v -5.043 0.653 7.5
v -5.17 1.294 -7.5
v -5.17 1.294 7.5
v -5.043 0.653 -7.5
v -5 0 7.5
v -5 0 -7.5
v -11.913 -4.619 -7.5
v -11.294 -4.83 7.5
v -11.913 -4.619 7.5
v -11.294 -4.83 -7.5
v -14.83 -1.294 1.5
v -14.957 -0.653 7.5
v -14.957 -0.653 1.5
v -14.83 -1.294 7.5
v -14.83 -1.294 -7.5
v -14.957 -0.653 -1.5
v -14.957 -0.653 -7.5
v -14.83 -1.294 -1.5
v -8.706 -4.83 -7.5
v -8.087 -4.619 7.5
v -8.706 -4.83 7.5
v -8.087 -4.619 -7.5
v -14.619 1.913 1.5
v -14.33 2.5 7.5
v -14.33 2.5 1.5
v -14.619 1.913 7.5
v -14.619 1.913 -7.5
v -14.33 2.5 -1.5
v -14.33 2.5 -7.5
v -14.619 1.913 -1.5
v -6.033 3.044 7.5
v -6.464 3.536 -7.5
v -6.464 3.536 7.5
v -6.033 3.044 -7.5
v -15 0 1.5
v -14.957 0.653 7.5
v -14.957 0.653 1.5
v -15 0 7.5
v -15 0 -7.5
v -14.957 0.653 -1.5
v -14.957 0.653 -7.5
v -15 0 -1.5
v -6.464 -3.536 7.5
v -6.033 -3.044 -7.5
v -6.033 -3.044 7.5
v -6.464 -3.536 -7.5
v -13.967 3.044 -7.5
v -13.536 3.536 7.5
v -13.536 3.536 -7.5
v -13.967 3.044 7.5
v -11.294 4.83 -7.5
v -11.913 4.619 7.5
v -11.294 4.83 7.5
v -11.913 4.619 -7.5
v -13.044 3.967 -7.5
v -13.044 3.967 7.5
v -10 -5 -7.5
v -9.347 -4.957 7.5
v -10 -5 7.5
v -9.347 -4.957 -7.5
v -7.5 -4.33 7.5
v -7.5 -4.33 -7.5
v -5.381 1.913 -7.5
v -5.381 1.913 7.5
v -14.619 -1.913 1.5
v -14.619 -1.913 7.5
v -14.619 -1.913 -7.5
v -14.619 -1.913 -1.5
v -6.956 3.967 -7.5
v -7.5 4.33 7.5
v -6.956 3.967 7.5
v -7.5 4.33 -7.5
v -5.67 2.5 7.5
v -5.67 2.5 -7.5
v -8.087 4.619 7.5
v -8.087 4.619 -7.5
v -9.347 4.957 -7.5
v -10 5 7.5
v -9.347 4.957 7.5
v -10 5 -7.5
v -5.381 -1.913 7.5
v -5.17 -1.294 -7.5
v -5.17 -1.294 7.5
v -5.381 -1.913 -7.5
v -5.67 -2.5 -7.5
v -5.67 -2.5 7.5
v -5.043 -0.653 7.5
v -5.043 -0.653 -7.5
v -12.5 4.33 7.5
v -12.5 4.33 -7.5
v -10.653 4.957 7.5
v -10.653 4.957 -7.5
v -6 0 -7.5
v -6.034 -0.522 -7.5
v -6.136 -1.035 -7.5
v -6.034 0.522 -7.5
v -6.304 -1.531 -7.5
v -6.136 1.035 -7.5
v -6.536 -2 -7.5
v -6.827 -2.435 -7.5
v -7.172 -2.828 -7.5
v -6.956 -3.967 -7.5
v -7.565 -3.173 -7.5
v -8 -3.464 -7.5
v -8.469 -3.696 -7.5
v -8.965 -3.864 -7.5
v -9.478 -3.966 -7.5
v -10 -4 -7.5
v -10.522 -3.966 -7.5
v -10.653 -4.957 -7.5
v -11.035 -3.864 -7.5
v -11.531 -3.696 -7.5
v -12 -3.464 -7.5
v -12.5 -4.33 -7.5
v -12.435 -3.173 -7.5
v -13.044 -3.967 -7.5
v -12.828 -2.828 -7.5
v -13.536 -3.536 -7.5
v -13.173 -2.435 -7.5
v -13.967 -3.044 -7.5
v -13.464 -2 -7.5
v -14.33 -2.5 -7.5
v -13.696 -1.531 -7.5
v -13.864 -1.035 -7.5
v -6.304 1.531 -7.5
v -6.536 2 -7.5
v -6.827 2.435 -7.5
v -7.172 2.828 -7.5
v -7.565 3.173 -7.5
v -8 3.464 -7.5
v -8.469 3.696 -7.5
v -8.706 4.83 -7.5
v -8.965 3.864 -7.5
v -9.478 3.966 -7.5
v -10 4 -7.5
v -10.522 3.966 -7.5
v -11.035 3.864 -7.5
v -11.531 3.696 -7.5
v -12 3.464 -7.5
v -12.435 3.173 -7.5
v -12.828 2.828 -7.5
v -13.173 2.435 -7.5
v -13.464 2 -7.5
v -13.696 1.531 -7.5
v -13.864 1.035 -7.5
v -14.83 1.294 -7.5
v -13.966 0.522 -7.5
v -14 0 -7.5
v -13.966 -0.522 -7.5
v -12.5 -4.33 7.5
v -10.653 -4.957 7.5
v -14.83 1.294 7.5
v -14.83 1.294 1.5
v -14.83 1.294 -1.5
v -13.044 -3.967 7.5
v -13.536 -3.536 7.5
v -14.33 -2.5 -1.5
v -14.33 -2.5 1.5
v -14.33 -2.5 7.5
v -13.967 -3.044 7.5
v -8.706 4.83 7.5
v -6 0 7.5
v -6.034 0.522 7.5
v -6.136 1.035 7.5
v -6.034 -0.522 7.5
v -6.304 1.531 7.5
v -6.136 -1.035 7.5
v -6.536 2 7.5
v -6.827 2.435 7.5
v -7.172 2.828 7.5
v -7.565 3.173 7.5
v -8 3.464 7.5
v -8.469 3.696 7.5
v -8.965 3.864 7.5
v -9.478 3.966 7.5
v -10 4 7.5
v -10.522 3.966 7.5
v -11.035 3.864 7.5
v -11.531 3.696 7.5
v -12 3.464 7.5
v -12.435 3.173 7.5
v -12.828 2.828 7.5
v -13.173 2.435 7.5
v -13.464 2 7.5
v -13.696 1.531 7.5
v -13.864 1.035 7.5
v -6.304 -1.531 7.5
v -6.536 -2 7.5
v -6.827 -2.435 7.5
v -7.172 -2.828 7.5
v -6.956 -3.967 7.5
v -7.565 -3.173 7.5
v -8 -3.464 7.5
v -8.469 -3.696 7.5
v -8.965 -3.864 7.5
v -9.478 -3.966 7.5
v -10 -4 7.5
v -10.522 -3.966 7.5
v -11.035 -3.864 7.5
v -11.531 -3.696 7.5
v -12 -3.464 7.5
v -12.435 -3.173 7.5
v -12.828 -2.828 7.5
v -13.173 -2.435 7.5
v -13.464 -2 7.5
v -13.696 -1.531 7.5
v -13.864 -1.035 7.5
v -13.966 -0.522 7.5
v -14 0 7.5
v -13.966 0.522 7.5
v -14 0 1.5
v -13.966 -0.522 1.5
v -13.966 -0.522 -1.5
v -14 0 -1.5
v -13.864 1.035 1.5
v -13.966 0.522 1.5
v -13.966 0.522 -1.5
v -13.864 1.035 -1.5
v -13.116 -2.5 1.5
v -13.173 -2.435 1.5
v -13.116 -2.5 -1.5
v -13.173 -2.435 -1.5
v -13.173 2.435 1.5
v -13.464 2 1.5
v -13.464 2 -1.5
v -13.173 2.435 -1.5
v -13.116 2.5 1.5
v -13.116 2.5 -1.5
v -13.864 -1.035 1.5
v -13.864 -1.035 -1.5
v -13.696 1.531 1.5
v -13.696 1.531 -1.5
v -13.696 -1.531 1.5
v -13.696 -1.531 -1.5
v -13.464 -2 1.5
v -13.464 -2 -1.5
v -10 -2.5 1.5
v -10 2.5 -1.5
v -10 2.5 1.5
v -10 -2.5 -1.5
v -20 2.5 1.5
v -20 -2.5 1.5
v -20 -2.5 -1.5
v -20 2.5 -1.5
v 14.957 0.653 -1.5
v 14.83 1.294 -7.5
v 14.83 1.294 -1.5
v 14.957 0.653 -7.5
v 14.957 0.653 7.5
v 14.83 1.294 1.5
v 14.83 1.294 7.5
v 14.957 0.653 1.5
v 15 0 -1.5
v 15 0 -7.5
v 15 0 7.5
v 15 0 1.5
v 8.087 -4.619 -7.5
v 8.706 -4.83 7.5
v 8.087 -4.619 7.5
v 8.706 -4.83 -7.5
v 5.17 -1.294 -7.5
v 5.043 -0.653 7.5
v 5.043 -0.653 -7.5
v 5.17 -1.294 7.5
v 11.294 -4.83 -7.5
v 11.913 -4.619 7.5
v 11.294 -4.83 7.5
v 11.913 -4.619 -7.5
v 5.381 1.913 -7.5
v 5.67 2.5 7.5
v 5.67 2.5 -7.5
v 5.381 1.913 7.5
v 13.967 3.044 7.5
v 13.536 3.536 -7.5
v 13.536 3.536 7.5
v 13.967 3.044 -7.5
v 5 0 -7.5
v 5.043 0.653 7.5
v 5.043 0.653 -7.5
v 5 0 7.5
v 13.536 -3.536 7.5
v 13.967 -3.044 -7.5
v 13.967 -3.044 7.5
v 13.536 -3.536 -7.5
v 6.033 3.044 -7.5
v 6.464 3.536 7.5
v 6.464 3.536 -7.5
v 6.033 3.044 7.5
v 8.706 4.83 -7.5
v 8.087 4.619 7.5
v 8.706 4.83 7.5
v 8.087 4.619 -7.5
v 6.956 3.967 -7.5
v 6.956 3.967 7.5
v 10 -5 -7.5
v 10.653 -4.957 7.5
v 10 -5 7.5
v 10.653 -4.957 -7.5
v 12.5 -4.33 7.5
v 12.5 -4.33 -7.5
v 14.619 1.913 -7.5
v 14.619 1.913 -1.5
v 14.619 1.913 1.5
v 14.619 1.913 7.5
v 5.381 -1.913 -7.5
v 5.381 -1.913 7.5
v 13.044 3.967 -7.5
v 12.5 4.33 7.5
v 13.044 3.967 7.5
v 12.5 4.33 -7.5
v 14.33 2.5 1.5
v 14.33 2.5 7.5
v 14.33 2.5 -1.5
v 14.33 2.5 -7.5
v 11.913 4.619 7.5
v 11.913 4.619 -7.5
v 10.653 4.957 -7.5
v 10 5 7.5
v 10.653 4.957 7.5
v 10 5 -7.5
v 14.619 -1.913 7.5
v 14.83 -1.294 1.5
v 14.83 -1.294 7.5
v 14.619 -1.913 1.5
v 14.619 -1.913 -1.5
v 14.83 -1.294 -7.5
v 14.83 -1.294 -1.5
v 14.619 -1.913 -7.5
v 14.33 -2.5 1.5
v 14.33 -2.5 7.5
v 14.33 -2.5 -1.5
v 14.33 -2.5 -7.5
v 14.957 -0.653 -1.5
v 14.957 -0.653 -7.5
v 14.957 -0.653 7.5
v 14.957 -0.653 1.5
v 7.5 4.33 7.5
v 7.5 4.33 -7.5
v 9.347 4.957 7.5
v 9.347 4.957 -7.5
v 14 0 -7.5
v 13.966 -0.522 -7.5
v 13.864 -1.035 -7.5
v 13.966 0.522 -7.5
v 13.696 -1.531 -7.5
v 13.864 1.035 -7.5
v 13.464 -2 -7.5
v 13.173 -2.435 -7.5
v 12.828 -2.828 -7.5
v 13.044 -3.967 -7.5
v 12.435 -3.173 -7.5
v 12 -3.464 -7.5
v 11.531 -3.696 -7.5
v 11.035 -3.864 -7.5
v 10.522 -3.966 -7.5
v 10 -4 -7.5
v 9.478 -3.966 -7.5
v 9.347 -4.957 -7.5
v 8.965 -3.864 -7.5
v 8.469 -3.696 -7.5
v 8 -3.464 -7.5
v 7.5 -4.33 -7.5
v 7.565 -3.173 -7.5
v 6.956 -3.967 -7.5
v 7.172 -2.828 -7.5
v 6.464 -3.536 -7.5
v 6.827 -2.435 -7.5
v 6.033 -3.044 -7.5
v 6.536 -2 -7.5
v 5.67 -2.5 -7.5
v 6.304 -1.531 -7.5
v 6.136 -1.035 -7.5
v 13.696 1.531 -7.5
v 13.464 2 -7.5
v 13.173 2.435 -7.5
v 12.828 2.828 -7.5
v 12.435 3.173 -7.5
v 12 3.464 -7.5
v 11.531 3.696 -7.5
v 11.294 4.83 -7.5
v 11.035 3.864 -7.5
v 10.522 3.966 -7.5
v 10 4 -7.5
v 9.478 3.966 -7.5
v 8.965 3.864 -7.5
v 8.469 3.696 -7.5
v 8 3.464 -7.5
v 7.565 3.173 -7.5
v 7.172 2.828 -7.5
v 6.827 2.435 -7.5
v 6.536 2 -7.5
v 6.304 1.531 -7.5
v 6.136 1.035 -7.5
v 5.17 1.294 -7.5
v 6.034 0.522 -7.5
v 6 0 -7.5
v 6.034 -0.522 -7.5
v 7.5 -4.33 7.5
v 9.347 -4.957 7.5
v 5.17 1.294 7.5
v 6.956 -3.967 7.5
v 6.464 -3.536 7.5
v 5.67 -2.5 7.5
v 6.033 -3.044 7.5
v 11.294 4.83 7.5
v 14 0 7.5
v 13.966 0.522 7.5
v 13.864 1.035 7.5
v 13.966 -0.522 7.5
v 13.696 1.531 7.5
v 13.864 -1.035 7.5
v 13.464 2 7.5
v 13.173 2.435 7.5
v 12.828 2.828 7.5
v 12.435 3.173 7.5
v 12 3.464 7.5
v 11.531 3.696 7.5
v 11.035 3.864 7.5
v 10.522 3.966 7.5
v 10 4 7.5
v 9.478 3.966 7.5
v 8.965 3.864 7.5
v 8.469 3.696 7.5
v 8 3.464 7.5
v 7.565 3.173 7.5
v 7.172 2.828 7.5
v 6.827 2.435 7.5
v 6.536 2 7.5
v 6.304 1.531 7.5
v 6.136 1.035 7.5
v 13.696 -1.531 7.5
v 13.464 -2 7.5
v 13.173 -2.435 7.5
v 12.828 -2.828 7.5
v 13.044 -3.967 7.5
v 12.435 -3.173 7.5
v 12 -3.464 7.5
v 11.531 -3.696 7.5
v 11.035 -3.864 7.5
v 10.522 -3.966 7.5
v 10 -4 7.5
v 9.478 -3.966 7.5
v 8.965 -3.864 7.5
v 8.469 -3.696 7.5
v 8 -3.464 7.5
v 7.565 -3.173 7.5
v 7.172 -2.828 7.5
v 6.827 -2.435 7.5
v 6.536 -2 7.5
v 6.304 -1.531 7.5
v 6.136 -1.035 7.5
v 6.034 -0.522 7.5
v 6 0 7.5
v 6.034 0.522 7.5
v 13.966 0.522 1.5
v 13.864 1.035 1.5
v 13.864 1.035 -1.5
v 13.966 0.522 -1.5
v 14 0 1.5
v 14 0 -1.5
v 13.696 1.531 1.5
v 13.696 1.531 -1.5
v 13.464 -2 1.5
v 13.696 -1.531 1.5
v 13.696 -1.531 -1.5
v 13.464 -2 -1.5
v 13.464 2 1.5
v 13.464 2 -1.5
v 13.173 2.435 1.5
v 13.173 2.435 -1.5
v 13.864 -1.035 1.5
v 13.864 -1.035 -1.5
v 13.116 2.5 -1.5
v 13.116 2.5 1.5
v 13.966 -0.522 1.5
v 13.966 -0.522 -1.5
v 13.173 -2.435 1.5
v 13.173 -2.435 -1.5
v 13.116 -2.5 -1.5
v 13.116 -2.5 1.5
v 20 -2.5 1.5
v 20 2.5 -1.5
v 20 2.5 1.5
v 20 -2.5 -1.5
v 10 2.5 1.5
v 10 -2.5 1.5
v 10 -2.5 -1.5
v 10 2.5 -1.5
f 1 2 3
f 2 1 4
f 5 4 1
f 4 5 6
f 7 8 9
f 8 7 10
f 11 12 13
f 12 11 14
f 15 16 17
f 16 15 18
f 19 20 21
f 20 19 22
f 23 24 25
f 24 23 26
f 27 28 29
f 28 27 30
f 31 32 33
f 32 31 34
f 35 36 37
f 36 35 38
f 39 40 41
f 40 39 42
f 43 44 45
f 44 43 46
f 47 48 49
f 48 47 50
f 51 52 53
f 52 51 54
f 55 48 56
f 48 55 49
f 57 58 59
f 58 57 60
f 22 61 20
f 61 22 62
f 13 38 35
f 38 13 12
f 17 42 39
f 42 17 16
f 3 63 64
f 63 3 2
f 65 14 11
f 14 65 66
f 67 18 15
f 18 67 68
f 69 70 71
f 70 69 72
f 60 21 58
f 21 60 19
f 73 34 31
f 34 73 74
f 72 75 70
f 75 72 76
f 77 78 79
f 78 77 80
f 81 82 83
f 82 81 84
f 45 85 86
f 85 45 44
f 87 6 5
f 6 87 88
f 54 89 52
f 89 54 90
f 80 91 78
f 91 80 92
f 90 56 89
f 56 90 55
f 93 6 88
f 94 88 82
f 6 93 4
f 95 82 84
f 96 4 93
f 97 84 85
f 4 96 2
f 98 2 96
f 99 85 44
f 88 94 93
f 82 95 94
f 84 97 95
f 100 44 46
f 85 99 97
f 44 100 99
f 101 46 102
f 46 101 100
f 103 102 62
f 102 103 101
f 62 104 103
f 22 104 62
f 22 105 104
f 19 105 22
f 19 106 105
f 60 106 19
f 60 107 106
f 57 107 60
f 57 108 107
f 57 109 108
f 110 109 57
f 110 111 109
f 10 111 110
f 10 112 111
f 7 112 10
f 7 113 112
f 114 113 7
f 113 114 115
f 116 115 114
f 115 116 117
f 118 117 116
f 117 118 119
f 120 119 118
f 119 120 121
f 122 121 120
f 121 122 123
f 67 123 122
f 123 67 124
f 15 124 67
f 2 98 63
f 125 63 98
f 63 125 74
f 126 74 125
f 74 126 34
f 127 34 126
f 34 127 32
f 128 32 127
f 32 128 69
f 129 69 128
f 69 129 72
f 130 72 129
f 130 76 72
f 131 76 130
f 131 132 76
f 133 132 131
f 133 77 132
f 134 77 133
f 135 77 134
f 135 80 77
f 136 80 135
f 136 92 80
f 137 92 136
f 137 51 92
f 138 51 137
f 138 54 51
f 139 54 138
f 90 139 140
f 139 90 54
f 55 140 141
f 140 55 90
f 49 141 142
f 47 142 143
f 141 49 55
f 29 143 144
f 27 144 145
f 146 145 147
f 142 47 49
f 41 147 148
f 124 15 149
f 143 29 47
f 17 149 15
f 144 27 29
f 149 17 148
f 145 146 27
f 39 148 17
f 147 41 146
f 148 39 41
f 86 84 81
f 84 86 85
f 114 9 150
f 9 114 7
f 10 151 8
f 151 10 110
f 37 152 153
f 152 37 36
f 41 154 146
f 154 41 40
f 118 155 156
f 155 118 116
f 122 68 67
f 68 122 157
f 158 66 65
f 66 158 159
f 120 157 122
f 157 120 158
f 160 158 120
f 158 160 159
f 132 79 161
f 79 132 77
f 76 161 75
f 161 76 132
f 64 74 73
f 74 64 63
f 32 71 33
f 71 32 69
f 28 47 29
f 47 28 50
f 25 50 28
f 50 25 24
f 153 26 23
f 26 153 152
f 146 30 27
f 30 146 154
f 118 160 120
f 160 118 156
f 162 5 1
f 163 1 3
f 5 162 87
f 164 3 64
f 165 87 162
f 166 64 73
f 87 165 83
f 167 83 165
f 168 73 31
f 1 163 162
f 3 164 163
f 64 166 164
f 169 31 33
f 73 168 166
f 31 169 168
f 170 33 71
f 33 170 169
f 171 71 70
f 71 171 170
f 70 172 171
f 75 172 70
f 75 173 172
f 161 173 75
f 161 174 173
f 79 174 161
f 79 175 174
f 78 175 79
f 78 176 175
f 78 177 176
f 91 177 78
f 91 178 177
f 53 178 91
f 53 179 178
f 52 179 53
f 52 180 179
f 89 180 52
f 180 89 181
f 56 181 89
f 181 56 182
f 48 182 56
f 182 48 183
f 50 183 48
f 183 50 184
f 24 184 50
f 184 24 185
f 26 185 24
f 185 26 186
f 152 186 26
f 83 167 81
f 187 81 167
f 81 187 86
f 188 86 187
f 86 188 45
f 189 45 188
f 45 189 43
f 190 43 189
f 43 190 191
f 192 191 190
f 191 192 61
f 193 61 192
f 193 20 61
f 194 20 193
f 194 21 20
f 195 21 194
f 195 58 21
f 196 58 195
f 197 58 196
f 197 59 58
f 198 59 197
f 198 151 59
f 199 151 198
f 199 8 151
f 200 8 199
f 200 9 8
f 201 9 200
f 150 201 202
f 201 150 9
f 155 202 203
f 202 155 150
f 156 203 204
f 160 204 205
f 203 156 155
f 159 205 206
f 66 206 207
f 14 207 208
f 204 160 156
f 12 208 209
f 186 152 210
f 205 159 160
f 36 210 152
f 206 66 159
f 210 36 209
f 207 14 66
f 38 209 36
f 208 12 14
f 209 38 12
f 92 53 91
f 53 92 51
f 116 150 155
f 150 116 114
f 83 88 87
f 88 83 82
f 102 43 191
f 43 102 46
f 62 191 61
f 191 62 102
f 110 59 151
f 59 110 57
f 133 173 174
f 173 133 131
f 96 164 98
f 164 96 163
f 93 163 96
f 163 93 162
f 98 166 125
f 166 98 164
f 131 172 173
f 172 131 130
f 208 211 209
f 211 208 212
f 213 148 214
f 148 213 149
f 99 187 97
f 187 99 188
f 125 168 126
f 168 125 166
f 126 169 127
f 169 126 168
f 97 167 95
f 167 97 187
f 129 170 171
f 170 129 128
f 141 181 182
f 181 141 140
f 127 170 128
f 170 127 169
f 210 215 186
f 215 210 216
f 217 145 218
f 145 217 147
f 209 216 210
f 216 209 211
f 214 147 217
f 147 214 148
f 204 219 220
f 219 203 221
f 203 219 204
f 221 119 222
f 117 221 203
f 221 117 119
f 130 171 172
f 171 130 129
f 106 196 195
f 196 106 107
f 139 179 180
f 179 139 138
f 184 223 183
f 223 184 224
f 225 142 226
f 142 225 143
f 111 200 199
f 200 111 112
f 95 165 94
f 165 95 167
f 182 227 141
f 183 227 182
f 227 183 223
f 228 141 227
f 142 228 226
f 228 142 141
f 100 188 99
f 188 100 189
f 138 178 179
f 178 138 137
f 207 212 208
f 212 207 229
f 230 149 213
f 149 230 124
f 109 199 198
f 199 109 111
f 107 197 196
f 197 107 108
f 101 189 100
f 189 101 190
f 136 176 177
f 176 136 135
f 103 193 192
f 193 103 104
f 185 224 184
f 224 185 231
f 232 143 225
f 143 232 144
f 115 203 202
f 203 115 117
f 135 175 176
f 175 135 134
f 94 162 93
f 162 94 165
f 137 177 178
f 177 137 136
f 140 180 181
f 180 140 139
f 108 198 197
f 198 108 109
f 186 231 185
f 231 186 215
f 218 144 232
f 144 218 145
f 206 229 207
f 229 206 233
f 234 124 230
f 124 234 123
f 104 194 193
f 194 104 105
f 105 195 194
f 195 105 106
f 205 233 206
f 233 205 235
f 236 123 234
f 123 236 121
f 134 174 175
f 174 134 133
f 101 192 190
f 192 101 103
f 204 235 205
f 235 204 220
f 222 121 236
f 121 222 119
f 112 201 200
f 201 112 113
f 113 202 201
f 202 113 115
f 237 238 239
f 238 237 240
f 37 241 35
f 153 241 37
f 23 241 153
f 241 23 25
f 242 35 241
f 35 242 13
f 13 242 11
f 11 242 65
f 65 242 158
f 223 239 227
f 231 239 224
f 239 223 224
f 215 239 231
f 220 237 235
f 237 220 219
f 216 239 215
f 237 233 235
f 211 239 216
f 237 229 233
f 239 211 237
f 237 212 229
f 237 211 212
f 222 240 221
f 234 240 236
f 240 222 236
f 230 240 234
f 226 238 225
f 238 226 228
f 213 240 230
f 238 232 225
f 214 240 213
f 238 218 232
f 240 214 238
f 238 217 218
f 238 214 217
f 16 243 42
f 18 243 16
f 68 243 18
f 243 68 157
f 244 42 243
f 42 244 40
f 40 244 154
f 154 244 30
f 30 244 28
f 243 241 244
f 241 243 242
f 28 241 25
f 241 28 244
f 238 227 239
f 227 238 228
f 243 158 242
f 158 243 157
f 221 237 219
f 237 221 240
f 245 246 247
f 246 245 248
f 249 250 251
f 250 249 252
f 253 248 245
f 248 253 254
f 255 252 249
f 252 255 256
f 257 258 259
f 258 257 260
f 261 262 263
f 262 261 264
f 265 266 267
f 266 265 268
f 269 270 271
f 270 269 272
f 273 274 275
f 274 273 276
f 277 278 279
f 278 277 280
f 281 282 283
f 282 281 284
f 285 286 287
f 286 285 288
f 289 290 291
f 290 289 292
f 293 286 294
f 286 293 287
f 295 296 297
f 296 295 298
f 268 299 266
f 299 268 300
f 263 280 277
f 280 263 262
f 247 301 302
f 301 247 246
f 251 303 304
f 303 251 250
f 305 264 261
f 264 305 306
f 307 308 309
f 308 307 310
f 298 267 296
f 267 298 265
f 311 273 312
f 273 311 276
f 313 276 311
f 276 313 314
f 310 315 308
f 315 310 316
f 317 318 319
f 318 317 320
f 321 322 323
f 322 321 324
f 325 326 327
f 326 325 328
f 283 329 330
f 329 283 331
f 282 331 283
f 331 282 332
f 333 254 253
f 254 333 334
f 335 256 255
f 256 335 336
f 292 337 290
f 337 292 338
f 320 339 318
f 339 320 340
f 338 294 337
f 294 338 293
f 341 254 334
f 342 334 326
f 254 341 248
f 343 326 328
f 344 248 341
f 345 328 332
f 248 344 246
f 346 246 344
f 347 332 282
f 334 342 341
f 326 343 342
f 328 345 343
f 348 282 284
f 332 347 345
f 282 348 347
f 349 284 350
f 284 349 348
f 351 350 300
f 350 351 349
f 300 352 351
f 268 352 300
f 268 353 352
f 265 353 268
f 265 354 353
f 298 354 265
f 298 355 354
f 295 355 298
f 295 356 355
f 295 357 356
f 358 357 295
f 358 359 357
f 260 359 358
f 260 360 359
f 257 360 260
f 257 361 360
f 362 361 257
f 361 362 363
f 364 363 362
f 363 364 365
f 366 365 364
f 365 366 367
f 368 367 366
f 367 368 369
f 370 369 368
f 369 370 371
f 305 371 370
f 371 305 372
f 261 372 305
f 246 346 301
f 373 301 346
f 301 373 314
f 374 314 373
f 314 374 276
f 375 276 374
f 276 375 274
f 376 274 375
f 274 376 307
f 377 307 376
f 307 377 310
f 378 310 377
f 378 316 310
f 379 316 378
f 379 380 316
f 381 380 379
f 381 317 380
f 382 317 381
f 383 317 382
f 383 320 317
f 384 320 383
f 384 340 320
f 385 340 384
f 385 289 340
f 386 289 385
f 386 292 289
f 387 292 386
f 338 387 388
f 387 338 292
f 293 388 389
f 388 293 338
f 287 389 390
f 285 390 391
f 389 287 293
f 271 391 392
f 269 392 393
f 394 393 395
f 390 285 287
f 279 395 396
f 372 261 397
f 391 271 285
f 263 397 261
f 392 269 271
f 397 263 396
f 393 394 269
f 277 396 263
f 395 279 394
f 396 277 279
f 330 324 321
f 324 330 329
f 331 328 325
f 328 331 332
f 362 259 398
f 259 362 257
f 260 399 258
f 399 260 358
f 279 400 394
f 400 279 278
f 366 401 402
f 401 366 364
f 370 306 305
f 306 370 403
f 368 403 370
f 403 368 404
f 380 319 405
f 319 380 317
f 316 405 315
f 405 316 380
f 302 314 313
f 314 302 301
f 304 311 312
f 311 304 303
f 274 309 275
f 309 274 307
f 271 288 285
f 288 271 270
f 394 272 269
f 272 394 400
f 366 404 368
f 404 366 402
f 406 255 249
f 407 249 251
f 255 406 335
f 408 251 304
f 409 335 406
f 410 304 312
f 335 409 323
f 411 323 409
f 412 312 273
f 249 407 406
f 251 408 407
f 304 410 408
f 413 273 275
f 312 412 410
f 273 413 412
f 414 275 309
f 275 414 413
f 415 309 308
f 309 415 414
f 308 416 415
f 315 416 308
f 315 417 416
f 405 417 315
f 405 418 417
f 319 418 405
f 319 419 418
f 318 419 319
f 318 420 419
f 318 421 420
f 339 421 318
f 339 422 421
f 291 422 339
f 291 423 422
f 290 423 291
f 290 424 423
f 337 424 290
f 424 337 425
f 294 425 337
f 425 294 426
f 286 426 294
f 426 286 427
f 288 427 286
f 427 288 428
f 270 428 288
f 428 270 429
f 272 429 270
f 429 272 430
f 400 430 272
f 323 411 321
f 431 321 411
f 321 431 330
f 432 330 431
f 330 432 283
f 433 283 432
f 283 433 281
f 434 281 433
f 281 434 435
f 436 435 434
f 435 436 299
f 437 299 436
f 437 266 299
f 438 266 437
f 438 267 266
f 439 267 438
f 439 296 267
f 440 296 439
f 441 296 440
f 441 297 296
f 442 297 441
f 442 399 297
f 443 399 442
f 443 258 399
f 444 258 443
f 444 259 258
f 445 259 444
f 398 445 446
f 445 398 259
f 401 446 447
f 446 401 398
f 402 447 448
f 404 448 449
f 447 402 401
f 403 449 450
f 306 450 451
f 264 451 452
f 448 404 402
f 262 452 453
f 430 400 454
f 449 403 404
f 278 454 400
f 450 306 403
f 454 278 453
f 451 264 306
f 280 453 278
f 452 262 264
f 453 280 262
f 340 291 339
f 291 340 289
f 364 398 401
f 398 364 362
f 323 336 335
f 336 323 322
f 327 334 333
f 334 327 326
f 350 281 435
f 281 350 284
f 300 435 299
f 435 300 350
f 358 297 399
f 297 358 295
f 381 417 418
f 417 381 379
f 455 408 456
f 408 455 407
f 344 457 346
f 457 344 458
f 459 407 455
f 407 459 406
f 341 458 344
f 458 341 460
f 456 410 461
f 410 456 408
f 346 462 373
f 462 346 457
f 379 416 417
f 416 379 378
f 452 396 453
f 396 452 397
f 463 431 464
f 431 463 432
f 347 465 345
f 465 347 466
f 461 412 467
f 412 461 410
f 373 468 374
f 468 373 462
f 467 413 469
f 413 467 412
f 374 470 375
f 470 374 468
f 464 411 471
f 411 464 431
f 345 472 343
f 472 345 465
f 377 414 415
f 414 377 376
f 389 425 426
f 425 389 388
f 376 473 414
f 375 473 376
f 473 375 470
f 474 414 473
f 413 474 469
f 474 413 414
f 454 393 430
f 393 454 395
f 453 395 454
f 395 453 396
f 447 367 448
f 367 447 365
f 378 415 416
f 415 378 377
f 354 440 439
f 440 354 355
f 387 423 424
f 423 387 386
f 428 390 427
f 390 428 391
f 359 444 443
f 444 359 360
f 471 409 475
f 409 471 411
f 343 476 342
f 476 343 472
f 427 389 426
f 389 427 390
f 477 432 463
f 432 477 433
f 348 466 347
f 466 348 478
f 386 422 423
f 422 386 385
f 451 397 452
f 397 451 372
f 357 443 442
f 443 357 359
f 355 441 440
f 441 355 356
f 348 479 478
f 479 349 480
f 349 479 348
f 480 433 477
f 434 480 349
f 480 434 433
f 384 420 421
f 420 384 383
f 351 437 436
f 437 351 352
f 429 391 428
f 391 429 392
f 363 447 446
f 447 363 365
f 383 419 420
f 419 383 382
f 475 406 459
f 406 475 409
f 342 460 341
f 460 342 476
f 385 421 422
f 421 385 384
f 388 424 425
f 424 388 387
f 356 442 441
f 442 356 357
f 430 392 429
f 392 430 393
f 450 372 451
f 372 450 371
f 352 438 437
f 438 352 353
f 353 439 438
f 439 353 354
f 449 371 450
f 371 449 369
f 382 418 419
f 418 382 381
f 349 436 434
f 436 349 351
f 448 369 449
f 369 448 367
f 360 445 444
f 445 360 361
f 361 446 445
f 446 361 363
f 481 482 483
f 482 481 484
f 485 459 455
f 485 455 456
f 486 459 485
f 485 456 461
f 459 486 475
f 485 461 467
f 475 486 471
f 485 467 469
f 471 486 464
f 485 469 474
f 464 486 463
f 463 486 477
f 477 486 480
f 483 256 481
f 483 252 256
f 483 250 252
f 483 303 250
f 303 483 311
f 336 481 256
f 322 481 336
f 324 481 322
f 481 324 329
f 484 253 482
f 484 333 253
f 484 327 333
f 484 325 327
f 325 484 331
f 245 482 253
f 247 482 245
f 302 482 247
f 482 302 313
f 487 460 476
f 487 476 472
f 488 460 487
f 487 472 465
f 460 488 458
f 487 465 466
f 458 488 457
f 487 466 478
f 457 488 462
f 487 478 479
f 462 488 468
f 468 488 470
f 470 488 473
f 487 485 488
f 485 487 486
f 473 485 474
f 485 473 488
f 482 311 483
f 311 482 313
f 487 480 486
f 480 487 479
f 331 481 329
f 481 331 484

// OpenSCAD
// Generated by SolidPython 1.0.5 on 2021-06-01 16:28:58
$fn = 48;


union() {
	union() {
		translate(v = [-15, 0, 0]) {
			cube(center = true, size = [10, 5, 3]);
		}
		translate(v = [-10, 0, 0]) {
			difference() {
				cylinder(center = true, h = 15, r = 5);
				cylinder(center = true, h = 16, r = 4);
			}
		}
	}
	union() {
		translate(v = [15, 0, 0]) {
			cube(center = true, size = [10, 5, 3]);
		}
		translate(v = [10, 0, 0]) {
			difference() {
				cylinder(center = true, h = 15, r = 5);
				cylinder(center = true, h = 16, r = 4);
			}
		}
	}
}
/***********************************************
*********      SolidPython code:      **********
************************************************
 
#! /usr/bin/env python3
import sys

from solid import scad_render_to_file
from solid.objects import cube, cylinder, difference, translate, union
from solid.utils import right

SEGMENTS = 48


def basic_geometry():
    # SolidPython code can look a lot like OpenSCAD code.  It also has
    # some syntactic sugar built in that can make it look more pythonic.
    # Here are two identical pieces of geometry, one left and one right.

    # left_piece uses standard OpenSCAD grammar (note the commas between
    # block elements; OpenSCAD doesn't require this)
    left_piece = union()(
            translate((-15, 0, 0))(
                    cube([10, 5, 3], center=True)
            ),
            translate((-10, 0, 0))(
                    difference()(
                            cylinder(r=5, h=15, center=True),
                            cylinder(r=4, h=16, center=True)
                    )
            )
    )

    # Right piece uses a more Pythonic grammar.  + (plus) is equivalent to union(), 
    # - (minus) is equivalent to difference() and * (star) is equivalent to intersection
    # solid.utils also defines up(), down(), left(), right(), forward(), and back()
    # for common transforms.
    right_piece = right(15)(cube([10, 5, 3], center=True))
    cyl = cylinder(r=5, h=15, center=True) - cylinder(r=4, h=16, center=True)
    right_piece += right(10)(cyl)

    return union()(left_piece, right_piece)


if __name__ == '__main__':
    out_dir = sys.argv[1] if len(sys.argv) > 1 else None

    a = basic_geometry()

    # Adding the file_header argument as shown allows you to change
    # the detail of arcs by changing the SEGMENTS variable.  This can
    # be expensive when making lots of small curves, but is otherwise
    # useful.
    file_out = scad_render_to_file(a, out_dir=out_dir, file_header=f'$fn = {SEGMENTS};')
    print(f"{__file__}: SCAD file written to: \n{file_out}")
 
 
************************************************/
